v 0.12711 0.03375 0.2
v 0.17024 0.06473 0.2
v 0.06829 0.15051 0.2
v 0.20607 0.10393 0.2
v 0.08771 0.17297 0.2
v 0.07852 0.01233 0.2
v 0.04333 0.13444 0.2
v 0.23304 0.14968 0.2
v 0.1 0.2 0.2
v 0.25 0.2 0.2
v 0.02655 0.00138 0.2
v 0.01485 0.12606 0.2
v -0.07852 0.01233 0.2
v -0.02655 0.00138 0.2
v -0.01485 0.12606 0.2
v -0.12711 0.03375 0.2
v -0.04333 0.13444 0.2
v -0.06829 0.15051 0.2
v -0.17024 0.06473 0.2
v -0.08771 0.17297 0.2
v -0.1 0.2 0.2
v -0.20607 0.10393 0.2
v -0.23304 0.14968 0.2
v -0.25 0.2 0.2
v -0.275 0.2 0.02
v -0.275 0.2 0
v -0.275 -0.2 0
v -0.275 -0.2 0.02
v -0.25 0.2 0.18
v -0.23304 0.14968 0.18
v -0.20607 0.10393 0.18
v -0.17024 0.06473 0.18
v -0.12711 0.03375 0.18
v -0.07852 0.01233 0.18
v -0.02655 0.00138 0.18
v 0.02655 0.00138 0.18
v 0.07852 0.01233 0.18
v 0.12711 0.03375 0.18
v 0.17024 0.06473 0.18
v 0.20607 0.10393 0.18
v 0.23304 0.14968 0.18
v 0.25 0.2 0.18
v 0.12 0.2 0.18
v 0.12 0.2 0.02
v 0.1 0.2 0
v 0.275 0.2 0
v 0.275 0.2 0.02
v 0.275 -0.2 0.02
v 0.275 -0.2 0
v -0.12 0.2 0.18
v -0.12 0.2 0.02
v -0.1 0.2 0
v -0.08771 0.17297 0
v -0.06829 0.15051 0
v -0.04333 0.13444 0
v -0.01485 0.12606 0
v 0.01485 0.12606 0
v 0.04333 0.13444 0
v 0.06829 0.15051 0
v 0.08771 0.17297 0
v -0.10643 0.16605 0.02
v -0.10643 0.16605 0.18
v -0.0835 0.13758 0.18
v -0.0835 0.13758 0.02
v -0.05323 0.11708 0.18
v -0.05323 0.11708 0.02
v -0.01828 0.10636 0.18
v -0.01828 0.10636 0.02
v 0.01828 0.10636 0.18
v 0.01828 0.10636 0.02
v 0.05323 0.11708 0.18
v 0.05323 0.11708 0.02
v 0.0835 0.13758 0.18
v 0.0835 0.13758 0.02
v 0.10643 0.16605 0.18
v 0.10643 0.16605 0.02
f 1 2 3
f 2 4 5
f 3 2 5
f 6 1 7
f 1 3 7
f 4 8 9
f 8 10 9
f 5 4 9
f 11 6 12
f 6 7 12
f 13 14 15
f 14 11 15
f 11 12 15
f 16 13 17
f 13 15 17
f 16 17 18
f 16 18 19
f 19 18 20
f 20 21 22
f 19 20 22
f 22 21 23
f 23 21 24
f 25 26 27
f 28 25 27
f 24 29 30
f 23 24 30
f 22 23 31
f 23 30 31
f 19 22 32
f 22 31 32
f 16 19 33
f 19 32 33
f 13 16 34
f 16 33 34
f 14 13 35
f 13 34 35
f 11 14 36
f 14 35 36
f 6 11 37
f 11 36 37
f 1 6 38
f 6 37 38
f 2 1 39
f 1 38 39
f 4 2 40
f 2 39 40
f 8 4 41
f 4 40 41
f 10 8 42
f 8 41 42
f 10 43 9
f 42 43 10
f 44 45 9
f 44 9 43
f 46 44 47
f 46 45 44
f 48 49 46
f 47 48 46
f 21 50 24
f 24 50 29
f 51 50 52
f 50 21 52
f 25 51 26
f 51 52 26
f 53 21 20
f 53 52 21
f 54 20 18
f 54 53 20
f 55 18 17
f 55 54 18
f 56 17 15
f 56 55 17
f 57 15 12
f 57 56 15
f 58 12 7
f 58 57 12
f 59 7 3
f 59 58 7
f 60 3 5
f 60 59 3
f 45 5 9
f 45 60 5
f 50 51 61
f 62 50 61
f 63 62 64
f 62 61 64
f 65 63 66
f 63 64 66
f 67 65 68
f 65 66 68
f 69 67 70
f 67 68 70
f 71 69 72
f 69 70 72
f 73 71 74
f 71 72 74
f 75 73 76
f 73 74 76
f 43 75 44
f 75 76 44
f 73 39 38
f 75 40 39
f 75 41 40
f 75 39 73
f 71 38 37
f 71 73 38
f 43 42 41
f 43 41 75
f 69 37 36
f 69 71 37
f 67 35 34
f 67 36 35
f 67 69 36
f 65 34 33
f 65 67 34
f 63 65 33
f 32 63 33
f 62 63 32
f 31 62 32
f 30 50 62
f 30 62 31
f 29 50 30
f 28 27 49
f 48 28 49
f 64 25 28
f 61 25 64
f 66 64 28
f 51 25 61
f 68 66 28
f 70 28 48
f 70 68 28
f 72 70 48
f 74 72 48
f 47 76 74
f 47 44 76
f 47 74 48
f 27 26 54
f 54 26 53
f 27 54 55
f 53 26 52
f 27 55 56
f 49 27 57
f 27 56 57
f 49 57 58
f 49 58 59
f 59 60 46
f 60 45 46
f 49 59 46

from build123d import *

# Parameters (mm, degrees)
PAD_DEPTH    = 0.02
PAD001_DEPTH = 0.16
PAD002_DEPTH = 0.02


with BuildPart() as part:
    # Sketch → Pad (new body)
    with BuildSketch(Plane.XY):
        with BuildLine():
            Line((-0.275, 0.2), (-0.275, -0.2))
            Line((-0.275, -0.2), (0.275, -0.2))
            Line((0.275, -0.2), (0.275, 0.2))
            Line((0.275, 0.2), (0.1, 0.2))
            ThreePointArc((-0.1, 0.2), (0, 0.125), (0.1, 0.2))
            Line((-0.275, 0.2), (-0.1, 0.2))
        make_face()
    extrude(amount=PAD_DEPTH)

    # Sketch001 (on Face8 of Pad) → Pad001 (join)
    with BuildSketch(Plane.XY.offset(0.02)):
        with BuildLine():
            Line((-0.1, 0.2), (-0.12, 0.2))
            ThreePointArc((-0.12, 0.2), (0, 0.105), (0.12, 0.2))
            Line((0.1, 0.2), (0.12, 0.2))
            ThreePointArc((-0.1, 0.2), (0, 0.125), (0.1, 0.2))
        make_face()
    extrude(amount=PAD001_DEPTH)

    # Sketch002 (on Face12 of Pad001) → Pad002 (join)
    with BuildSketch(Plane.XY.offset(0.18)):
        with BuildLine():
            ThreePointArc((-0.1, 0.2), (0, 0.125), (0.1, 0.2))
            Line((0.1, 0.2), (0.25, 0.2))
            ThreePointArc((-0.25, 0.2), (0, 0), (0.25, 0.2))
            Line((-0.1, 0.2), (-0.25, 0.2))
        make_face()
    extrude(amount=PAD002_DEPTH)


solid = part.part
